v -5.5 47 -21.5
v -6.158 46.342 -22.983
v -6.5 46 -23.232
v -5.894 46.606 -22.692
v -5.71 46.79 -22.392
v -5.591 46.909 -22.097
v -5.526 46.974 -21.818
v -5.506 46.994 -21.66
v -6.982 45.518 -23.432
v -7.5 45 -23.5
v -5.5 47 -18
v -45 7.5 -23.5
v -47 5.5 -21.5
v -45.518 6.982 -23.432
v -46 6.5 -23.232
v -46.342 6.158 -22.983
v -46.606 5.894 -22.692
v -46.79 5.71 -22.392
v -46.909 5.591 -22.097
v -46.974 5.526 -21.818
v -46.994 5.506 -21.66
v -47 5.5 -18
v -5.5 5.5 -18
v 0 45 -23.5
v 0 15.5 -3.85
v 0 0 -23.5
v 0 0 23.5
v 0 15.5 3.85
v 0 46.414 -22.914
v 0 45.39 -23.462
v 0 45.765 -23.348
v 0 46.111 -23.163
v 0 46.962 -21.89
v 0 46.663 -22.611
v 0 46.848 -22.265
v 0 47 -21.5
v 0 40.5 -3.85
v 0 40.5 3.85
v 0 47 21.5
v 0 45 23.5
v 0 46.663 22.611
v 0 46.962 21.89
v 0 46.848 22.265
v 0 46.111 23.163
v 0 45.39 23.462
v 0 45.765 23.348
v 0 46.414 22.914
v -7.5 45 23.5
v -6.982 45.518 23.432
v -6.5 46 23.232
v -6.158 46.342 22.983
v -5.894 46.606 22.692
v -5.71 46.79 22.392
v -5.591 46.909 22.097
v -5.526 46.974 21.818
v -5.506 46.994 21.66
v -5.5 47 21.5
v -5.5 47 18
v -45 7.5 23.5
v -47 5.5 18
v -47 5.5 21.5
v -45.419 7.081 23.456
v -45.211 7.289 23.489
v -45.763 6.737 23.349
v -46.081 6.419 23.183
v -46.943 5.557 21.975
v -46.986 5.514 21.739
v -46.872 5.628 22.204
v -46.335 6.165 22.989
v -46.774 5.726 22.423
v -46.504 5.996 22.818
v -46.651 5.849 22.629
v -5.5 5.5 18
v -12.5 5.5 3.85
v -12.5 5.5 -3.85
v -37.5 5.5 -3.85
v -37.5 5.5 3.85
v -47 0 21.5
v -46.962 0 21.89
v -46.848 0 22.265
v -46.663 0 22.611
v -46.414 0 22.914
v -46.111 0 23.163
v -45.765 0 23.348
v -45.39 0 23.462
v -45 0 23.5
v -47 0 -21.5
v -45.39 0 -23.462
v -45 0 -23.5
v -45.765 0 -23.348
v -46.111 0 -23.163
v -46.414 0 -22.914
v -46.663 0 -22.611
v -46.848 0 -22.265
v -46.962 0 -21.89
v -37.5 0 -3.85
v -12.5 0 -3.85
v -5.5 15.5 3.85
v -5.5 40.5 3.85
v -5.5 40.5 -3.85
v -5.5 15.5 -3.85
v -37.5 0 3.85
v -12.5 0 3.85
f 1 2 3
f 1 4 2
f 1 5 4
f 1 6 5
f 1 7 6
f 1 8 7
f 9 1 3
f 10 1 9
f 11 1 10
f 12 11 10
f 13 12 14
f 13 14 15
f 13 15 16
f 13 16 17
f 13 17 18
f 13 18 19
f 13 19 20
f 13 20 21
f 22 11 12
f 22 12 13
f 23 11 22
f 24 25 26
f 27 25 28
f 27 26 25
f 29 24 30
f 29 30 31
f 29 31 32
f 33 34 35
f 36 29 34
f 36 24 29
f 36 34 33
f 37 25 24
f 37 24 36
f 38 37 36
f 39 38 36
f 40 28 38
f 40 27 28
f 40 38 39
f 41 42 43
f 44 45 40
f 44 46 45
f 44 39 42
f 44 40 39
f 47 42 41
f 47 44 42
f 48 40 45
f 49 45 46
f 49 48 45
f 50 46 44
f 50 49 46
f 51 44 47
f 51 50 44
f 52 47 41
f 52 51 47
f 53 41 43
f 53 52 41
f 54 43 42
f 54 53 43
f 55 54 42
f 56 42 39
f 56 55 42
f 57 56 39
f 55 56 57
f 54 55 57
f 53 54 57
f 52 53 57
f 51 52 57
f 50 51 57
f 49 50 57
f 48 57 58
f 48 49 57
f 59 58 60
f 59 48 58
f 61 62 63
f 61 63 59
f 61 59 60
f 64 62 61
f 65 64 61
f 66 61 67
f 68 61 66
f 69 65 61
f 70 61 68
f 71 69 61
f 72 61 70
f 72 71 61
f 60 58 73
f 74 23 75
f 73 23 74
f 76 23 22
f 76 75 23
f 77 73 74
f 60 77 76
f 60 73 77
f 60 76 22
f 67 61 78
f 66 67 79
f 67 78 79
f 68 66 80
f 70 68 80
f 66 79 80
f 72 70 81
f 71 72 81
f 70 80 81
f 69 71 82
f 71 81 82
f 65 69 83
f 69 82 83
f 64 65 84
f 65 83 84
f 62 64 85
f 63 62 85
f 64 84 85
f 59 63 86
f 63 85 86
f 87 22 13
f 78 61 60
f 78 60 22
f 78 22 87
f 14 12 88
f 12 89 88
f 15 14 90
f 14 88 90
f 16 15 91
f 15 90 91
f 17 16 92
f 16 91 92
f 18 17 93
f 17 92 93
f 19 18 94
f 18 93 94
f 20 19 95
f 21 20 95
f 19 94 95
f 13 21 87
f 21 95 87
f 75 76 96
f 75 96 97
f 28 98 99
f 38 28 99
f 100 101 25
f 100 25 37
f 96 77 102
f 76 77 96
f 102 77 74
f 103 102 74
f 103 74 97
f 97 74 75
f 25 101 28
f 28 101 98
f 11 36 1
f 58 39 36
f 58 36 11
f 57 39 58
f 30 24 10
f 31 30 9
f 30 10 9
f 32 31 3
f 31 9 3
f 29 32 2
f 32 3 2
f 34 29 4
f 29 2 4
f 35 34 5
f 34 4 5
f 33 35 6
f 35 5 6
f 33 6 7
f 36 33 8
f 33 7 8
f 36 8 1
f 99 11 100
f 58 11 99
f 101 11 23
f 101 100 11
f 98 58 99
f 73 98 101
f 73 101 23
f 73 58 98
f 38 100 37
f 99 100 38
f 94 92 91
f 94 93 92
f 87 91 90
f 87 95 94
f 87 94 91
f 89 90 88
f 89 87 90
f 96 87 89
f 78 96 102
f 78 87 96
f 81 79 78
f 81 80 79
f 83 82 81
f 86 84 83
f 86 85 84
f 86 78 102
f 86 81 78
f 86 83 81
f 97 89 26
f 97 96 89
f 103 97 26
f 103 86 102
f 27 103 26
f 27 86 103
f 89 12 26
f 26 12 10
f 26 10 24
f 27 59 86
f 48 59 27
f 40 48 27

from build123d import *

# Parameters (mm, degrees)
BOSS_EXTRUDE1_DEPTH = 23.5
CUT_EXTRUDE1_DEPTH  = 18
SKETCH3_W           = 7.7
SKETCH3_H           = 25
CUT_EXTRUDE2_DEPTH  = 6.5
SKETCH4_W           = 25
SKETCH4_H           = 7.7
CUT_EXTRUDE3_DEPTH  = 6.5
FILLET1_R           = 2


with BuildPart() as part:
    # Sketch1 → Boss-Extrude1 (new body, symmetric)
    with BuildSketch(Plane.XY):
        Polygon((-47, 0), (0, 0), (0, 47), (-5.5, 47), (-47, 5.5), align=None)
    extrude(amount=BOSS_EXTRUDE1_DEPTH, both=True)

    # Sketch2 → Cut-Extrude1 (cut, symmetric)
    with BuildSketch(Plane.XY):
        Polygon((-5.5, 47), (-5.5, 5.5), (-47, 5.5), align=None)
    extrude(amount=CUT_EXTRUDE1_DEPTH, both=True, mode=Mode.SUBTRACT)

    # Sketch3 → Cut-Extrude2 (cut, through all)
    with BuildSketch(Plane.ZY.offset(5.5)):
        with Locations((0, 28)):
            Rectangle(SKETCH3_W, SKETCH3_H)
    extrude(amount=-CUT_EXTRUDE2_DEPTH, mode=Mode.SUBTRACT)

    # Sketch4 → Cut-Extrude3 (cut, through all)
    with BuildSketch(Plane(origin=(0, 5.5, 0), x_dir=(1, 0, 0), z_dir=(0, 1, 0))):
        with Locations((-25, 0)):
            Rectangle(SKETCH4_W, SKETCH4_H)
    extrude(amount=-CUT_EXTRUDE3_DEPTH, mode=Mode.SUBTRACT)

    # Fillet1
    fillet1_edges = [part.edges().sort_by_distance(p)[0] for p in [
        (-2.75, 47, 23.5),
        (-47, 2.75, 23.5),
        (-2.75, 47, -23.5),
        (-47, 2.75, -23.5),
    ]]
    fillet(fillet1_edges, radius=FILLET1_R)


solid = part.part
